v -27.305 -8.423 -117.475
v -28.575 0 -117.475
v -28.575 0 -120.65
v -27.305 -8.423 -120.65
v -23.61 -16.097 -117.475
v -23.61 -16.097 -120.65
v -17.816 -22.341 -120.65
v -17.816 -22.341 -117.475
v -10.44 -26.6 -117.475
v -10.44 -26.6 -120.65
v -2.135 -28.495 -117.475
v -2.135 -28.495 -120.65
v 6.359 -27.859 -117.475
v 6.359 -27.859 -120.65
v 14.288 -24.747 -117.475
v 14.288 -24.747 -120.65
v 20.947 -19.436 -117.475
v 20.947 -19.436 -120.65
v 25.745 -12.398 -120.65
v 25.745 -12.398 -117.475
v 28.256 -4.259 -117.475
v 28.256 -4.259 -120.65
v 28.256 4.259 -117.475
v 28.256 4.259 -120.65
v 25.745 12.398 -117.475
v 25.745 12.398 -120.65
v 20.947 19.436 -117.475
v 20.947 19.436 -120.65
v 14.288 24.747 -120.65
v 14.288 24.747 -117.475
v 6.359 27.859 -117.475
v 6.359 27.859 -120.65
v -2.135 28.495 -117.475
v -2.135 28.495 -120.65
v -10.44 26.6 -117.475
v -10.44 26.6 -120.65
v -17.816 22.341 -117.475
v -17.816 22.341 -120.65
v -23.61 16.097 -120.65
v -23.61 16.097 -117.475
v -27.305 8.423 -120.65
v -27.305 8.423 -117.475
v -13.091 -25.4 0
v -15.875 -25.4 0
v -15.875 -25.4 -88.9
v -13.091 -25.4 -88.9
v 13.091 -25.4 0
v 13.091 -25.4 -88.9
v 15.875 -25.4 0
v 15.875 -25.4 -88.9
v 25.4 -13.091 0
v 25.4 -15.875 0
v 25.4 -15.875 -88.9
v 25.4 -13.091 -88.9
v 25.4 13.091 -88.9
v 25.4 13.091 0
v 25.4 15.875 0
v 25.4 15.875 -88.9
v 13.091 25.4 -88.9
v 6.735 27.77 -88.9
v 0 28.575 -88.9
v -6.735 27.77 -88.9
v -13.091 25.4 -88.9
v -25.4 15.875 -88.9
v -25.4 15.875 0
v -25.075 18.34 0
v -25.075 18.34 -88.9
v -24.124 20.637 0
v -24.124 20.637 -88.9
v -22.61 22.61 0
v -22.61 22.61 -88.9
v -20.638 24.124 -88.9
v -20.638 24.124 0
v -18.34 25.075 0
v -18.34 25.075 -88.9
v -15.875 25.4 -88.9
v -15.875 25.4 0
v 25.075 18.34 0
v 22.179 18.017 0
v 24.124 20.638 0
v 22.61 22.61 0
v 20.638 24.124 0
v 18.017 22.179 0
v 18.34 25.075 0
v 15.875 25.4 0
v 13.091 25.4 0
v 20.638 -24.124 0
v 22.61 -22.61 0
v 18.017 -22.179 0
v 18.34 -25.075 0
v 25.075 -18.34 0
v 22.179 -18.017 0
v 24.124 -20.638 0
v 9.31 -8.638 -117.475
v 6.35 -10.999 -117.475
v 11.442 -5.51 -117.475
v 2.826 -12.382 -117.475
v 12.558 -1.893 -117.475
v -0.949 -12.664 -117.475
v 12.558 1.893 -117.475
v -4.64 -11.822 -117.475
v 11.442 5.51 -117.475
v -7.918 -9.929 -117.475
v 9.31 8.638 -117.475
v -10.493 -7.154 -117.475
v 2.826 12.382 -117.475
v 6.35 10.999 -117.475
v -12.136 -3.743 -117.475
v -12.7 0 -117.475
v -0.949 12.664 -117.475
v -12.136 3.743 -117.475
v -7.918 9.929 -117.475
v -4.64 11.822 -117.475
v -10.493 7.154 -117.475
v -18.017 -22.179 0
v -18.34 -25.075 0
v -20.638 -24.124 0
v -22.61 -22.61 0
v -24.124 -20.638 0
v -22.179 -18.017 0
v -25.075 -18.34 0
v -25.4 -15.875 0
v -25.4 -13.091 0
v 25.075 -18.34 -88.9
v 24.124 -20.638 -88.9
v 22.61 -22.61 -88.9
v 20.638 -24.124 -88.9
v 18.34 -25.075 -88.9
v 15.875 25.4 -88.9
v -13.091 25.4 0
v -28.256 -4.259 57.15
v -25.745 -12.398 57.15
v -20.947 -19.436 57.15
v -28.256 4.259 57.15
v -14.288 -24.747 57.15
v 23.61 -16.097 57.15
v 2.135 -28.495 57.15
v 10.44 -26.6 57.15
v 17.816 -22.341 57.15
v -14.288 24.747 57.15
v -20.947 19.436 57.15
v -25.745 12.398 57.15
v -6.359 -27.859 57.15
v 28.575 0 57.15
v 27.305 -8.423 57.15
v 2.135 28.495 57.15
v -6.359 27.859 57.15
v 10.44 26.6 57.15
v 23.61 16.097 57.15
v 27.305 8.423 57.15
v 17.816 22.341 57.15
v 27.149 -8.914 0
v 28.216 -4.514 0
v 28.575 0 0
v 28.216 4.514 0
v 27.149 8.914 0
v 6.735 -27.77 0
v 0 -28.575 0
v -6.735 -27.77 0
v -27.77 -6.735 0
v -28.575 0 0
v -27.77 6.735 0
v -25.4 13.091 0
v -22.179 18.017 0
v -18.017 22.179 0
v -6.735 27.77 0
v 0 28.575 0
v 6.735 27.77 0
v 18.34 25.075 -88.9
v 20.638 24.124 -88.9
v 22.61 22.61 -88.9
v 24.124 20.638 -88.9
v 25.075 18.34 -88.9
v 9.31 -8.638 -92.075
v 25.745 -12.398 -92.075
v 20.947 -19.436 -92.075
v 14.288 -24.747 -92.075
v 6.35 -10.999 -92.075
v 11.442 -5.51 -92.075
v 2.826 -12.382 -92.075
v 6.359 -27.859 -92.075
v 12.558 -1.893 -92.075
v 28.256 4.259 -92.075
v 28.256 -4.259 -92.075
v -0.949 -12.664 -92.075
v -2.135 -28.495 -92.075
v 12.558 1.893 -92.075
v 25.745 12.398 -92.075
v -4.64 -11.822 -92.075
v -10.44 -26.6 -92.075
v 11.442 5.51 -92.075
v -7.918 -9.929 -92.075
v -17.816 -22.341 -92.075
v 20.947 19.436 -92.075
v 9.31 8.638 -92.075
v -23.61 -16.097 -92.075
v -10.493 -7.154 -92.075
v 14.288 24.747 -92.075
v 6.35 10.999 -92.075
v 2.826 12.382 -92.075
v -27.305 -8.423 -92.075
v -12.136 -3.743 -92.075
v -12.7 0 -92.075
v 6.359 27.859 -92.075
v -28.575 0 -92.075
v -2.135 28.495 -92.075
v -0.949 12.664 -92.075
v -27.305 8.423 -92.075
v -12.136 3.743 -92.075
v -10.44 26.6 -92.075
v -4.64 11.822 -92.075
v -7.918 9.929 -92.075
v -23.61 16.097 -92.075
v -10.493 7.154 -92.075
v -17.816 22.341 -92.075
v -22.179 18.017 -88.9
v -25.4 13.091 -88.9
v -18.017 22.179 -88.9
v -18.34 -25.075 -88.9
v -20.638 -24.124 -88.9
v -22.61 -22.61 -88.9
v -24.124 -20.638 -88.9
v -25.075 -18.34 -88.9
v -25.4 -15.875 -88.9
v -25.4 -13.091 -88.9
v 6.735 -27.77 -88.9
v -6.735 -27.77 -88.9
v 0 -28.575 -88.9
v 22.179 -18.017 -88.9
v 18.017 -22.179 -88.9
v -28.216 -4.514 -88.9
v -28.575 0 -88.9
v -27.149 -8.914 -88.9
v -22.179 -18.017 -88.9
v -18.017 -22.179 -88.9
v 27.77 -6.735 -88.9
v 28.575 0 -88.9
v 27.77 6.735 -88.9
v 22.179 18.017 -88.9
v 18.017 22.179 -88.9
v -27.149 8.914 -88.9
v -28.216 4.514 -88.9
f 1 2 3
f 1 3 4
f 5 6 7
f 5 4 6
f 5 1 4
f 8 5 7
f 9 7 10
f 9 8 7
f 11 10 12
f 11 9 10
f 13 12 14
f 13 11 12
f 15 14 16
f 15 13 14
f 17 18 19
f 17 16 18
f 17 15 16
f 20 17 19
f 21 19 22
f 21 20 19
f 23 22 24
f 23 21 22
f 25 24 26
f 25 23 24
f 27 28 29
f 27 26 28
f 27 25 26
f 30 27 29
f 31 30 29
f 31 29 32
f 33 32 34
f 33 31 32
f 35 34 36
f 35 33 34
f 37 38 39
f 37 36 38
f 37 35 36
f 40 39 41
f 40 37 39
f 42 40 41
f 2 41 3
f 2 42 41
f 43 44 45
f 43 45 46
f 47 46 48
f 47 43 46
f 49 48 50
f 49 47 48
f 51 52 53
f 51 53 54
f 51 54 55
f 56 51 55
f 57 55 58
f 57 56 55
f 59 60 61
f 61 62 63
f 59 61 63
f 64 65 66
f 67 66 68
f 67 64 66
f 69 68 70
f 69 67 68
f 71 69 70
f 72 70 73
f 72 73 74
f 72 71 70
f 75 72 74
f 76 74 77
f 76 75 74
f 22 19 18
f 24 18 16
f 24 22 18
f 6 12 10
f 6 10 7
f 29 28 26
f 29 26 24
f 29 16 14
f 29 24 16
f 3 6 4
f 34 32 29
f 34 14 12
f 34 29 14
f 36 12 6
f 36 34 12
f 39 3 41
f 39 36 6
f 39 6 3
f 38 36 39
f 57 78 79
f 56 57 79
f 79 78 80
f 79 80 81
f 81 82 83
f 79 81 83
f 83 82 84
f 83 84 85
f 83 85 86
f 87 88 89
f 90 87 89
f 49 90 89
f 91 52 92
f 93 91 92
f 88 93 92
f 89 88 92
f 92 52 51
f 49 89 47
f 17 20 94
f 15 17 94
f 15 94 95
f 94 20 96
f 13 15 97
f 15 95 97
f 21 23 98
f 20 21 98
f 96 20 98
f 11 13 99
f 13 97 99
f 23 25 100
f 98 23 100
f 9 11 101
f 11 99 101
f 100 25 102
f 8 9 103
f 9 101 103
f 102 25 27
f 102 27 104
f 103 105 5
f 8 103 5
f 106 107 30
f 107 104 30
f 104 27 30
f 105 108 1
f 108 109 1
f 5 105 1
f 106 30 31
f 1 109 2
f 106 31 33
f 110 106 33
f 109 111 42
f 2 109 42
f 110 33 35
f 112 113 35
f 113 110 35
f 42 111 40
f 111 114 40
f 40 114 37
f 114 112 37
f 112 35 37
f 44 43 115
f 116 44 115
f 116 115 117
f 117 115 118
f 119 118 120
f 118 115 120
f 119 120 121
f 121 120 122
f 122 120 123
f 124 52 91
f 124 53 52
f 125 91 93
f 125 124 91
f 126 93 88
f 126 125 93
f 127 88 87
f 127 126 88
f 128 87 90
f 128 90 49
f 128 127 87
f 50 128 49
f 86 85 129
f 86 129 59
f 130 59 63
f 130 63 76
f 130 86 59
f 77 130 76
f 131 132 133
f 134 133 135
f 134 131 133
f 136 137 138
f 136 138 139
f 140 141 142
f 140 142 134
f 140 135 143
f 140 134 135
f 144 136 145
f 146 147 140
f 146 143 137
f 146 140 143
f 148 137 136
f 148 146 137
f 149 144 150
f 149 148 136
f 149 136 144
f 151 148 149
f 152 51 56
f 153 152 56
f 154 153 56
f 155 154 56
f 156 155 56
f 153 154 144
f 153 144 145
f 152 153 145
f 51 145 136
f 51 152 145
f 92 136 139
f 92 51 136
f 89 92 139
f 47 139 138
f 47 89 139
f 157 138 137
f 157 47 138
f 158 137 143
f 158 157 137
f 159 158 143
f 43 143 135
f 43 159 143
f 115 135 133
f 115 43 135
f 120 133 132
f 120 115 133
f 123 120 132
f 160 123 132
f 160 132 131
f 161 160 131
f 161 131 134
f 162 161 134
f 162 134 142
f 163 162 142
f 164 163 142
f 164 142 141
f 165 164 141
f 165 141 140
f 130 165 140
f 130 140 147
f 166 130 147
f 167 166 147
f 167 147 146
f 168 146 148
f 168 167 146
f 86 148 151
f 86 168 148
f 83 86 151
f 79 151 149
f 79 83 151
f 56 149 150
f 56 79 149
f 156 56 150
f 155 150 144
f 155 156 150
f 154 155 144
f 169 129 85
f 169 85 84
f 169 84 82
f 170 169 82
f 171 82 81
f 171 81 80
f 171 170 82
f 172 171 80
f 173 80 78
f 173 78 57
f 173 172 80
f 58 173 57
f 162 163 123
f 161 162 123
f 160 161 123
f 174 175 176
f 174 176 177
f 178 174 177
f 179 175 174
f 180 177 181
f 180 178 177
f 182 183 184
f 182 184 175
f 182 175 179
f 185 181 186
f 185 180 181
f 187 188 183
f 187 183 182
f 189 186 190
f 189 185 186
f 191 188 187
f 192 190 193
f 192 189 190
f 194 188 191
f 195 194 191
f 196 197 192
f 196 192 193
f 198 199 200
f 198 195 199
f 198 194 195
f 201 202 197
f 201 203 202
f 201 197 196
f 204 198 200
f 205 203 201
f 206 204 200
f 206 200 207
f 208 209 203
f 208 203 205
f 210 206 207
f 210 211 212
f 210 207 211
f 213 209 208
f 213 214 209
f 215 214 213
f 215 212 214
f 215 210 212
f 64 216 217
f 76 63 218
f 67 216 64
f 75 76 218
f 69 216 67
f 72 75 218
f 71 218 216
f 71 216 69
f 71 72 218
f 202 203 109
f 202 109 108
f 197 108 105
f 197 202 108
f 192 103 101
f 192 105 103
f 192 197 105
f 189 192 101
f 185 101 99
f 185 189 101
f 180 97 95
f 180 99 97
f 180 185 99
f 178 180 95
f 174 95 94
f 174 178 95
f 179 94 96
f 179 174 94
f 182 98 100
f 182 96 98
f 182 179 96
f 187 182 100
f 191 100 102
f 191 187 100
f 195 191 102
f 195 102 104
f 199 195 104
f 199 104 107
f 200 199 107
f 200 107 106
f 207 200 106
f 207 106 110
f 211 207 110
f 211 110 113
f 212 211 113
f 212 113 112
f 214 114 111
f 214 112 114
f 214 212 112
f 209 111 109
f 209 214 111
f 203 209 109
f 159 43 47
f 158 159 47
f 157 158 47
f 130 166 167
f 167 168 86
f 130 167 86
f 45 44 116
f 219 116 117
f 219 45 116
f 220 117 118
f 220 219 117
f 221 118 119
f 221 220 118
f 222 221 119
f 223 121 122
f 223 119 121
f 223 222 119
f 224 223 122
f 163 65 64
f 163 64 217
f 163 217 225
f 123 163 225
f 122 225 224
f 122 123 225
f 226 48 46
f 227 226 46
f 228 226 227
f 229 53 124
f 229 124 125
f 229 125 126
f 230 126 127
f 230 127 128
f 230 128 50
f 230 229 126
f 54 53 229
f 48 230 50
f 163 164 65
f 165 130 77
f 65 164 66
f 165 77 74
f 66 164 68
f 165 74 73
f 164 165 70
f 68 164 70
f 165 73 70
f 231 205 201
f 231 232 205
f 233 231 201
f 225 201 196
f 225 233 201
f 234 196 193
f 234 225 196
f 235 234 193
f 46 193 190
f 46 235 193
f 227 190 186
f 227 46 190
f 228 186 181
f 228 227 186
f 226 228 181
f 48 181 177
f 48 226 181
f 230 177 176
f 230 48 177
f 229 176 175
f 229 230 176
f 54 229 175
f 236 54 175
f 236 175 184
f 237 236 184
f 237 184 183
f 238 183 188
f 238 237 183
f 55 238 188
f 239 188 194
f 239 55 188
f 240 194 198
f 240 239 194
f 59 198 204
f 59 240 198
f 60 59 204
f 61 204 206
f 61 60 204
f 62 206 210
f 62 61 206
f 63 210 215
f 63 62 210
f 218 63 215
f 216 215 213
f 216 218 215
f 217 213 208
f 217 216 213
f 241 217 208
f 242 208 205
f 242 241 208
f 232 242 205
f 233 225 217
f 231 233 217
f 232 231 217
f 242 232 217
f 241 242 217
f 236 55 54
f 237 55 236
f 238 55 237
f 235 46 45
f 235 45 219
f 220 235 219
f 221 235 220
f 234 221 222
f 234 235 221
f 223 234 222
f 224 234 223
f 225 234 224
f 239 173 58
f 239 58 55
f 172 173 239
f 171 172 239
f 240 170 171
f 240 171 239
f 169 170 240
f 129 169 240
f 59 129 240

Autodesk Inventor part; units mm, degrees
ref_plane "YZ Plane" through (0, 0, 0) normal (1, 0, 0) x (0, 1, 0)
ref_plane "XZ Plane" through (0, 0, 0) normal (0, 1, 0) x (-1, 0, 0)
ref_plane "XY Plane" through (0, 0, 0) normal (0, 0, 1) x (1, 0, 0)
sketch "Sketch1" plane through (0, 0, 0) normal (0, 0, 1) x (1, 0, 0)
  circle A0 centre (0, 0) radius 28.575
  dimension "d0" = 57.15
extrude "Extrusion1" add sketch "Sketch1" along normal blind 57.15
sketch "Sketch2" plane through (0, 0, 0) normal (0, 0, -1) x (-1, 0, 0)
  circle A0 centre (0, 0) radius 28.575 projected
  line L0 (-25.4, 25.4) -> (25.4, 25.4)
  line L1 (25.4, 25.4) -> (25.4, -25.4)
  line L2 (25.4, -25.4) -> (-25.4, -25.4)
  line L3 (-25.4, -25.4) -> (-25.4, 25.4)
  dimension "d4" = 25.4
  dimension "d5" = 25.4
  dimension "d6" = 25.4
  dimension "d7" = 25.4
extrude "Extrusion2" add sketch "Sketch2" along normal blind 88.9 contours L1 A0 L2 L3 L0 | A0 L0 L1 | L1 L2 A0 | A0 L3 L0 | L2 L3 A0
sketch "Sketch3" plane through (0, 0, -88.9) normal (0, 0, -1) x (-1, 0, 0)
  circle A0 centre (0, 0) radius 28.575
  dimension "d10" = 57.15
extrude "Extrusion3" add sketch "Sketch3" along normal blind 3.175
sketch "Sketch4" plane through (0, 0, -92.075) normal (0, 0, -1) x (-1, 0, 0)
  circle A0 centre (0, 0) radius 12.7
  dimension "d13" = 25.4
extrude "Extrusion4" add sketch "Sketch4" along normal blind 25.4
sketch "Sketch5" plane through (0, 0, -117.475) normal (0, 0, -1) x (-1, 0, 0)
  circle A0 centre (0, 0) radius 28.575
  dimension "d16" = 57.15
extrude "Extrusion5" add sketch "Sketch5" along normal blind 3.175
fillet "Fillet1" radius 9.525 4 edges at (25.4, 25.4, -44.45) (-25.4, 25.4, -44.45) (25.4, -25.4, -44.45) (-25.4, -25.4, -44.45)
equation "\"d4\" = d5"
equation "\"d7\" = d6"
properties part number "ScissorLiftMotorApproximation"
